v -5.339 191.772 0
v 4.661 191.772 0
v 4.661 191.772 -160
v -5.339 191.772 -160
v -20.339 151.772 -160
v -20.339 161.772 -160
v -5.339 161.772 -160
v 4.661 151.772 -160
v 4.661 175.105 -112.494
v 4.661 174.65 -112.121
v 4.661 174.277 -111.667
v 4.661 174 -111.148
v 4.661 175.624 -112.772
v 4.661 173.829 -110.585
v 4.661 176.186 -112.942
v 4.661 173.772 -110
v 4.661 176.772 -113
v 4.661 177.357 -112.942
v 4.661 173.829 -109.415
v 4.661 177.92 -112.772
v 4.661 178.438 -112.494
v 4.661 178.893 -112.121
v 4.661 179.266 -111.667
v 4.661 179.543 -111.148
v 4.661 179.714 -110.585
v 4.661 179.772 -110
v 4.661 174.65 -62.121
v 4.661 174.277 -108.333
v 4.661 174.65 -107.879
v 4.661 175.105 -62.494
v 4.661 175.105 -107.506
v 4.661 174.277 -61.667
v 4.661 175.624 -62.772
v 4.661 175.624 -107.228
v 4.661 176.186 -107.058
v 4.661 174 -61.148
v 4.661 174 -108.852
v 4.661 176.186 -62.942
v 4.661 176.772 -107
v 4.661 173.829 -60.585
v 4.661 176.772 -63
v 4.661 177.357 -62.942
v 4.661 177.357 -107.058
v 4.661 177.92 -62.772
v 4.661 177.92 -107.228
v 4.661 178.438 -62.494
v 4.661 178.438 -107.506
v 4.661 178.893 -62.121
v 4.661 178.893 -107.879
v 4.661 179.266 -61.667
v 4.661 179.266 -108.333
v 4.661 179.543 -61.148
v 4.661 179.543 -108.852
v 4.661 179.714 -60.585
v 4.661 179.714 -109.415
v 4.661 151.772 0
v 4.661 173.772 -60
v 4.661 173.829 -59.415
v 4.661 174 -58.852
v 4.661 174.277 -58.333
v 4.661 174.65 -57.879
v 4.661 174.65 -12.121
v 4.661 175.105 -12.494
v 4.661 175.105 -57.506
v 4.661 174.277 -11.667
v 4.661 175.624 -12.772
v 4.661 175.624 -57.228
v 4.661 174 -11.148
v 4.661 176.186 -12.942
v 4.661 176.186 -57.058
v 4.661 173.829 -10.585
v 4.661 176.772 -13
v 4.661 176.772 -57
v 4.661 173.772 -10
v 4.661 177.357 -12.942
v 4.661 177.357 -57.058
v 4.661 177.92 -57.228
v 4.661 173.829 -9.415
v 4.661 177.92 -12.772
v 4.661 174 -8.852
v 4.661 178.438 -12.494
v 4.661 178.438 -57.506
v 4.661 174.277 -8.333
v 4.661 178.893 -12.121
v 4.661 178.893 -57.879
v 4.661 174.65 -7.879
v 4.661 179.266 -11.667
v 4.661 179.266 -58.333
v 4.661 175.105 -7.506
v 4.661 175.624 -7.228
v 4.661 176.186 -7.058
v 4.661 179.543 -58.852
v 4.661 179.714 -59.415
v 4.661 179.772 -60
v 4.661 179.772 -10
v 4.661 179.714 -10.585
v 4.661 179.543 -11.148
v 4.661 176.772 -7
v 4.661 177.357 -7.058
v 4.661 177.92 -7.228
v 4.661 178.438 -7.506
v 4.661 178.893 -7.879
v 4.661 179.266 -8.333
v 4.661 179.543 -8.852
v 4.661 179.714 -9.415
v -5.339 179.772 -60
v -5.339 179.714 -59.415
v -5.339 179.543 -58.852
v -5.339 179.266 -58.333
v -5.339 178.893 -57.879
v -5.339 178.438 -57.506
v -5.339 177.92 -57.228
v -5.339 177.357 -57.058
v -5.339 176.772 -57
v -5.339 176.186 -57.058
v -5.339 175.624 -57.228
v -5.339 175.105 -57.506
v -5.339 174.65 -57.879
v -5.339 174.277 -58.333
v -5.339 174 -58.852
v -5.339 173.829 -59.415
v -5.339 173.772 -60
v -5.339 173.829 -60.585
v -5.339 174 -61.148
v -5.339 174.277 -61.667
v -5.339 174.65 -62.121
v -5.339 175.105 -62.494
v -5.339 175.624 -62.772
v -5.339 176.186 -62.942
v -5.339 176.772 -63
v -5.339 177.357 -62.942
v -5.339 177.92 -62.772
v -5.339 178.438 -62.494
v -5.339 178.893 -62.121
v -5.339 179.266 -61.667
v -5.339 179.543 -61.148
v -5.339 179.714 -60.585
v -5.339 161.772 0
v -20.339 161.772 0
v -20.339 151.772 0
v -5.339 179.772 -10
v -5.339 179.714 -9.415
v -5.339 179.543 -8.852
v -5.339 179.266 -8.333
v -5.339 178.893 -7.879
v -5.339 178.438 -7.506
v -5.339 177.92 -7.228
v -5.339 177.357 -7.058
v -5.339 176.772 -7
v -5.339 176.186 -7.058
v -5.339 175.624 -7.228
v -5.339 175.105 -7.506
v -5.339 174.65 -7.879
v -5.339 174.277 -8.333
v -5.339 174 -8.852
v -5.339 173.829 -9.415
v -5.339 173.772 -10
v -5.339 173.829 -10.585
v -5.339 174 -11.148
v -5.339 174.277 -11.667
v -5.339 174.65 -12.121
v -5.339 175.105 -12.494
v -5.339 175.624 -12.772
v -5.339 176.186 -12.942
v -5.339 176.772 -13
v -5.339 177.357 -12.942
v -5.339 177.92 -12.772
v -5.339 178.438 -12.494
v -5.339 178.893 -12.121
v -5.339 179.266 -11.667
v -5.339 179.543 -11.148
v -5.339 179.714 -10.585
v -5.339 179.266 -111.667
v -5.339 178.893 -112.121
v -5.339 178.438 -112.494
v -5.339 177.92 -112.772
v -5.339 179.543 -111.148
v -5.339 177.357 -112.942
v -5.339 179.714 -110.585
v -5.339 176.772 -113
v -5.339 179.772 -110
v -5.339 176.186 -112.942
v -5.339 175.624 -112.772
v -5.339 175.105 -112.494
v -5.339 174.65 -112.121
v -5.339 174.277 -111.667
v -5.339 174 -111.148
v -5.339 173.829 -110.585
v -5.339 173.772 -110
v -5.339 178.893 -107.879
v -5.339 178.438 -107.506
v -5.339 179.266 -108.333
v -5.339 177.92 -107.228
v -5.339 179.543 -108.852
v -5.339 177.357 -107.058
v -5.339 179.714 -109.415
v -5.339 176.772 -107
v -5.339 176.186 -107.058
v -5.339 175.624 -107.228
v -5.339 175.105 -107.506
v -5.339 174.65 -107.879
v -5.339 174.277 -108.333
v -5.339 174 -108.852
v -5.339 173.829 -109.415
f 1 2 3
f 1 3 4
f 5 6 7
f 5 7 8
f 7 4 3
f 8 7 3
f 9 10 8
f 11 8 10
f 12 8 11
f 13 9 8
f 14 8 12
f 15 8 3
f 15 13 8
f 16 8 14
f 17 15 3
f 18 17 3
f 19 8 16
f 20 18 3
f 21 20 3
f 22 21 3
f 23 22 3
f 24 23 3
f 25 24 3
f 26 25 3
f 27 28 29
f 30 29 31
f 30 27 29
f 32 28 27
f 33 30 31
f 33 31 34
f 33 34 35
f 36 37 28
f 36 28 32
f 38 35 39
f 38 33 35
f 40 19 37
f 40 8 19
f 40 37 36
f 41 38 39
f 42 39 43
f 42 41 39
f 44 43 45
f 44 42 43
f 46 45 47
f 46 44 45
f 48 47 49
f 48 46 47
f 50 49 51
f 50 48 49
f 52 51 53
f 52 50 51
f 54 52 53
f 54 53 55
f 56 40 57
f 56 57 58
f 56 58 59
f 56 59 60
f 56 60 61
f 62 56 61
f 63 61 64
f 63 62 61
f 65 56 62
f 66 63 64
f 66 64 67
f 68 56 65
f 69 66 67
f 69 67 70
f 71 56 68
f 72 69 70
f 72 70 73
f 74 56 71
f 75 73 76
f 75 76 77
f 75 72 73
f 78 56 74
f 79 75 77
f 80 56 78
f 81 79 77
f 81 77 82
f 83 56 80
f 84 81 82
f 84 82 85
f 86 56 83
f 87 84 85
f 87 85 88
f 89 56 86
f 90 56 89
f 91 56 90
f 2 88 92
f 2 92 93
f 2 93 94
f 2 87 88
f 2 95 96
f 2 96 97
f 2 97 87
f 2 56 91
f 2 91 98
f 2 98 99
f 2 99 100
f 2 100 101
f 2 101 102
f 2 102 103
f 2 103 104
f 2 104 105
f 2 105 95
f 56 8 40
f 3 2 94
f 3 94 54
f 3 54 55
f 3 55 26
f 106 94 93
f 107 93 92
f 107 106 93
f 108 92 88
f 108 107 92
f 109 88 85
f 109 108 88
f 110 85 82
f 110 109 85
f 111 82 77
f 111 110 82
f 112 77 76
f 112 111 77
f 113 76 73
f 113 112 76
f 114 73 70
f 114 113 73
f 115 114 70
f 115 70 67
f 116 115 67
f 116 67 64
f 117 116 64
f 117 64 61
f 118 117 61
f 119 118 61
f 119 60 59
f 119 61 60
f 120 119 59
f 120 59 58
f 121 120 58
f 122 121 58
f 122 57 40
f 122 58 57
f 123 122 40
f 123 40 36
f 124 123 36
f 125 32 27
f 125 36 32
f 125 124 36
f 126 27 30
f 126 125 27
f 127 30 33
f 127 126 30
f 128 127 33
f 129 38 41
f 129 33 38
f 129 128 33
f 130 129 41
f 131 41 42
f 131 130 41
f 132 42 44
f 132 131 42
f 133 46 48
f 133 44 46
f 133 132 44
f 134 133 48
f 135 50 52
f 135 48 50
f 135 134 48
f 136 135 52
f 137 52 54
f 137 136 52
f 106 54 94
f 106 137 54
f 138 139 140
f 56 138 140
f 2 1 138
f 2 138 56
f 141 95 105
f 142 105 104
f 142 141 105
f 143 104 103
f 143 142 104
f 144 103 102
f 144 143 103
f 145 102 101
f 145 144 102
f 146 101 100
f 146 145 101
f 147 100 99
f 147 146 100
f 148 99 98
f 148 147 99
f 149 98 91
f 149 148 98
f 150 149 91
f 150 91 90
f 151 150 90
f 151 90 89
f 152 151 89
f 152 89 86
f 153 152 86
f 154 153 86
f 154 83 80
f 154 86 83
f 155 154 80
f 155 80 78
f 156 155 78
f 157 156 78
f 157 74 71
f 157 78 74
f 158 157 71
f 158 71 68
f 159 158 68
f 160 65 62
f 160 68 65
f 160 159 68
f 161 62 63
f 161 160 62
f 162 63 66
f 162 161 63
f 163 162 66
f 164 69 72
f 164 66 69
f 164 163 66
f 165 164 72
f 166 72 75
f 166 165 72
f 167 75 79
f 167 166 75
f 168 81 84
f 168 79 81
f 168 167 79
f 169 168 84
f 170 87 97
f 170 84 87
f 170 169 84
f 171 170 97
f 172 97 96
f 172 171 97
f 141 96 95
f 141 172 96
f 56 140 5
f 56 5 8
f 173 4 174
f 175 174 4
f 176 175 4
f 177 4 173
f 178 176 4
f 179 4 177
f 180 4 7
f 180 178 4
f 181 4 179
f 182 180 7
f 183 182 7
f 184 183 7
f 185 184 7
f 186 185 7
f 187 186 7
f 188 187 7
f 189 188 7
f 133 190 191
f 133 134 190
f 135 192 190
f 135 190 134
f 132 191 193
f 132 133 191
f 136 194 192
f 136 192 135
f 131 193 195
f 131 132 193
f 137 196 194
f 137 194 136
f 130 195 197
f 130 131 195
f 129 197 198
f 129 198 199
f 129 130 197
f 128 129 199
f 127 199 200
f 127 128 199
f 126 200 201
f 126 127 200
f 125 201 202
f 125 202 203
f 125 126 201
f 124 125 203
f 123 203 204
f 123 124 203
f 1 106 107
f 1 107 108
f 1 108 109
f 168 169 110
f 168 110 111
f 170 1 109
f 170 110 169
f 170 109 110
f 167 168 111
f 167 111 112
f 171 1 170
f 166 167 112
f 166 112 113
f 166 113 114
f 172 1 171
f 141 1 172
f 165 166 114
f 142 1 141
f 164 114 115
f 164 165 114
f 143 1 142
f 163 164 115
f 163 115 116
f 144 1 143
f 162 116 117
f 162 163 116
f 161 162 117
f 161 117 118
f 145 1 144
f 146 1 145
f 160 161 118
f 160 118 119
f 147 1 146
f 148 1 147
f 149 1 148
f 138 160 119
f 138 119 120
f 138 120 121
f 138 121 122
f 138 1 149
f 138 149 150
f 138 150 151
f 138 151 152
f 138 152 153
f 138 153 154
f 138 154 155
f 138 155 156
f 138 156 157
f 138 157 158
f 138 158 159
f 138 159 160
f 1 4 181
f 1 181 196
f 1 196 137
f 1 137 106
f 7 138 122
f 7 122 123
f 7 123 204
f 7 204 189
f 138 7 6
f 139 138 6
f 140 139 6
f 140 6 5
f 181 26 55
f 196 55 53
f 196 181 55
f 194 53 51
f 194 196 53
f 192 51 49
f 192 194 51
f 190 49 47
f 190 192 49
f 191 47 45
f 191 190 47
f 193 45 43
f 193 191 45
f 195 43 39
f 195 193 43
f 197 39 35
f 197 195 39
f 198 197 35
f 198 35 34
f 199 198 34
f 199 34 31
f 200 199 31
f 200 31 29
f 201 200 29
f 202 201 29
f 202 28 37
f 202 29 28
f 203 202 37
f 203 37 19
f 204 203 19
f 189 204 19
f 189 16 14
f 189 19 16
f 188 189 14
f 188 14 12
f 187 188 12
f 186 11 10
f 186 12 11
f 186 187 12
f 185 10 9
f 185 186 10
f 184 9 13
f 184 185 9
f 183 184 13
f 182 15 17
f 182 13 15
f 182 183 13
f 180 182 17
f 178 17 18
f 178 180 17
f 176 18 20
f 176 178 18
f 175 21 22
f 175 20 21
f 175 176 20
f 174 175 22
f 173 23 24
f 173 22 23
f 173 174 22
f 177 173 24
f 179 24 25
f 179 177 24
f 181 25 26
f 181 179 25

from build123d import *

# Parameters (mm, degrees)
EXTRUDE_1_DEPTH     = 160
CUT_EXTRUDE_START   = -10
SKETCH_2_R          = 3
CUT_EXTRUDE_1_DEPTH = 262.00066797
LPATTERN1_COUNT     = 3
LPATTERN1_PITCH     = 50


with BuildPart() as part:
    # 草圖1 → 填料-伸長1 (new body)
    with BuildSketch(Plane.XY):
        Polygon((-5.338534676, 191.77157068), (-5.338534676, 161.77157068), (-20.338534676, 161.77157068), (-20.338534676, 151.77157068), (4.661465324, 151.77157068), (4.661465324, 191.77157068), align=None)
    extrude(amount=-EXTRUDE_1_DEPTH)

    # 草圖2 → 除料-伸長1 (cut)
    with BuildSketch(Plane(origin=(4.661465324, 0, 0), x_dir=(0, 0, -1), z_dir=(1, 0, 0)).offset(CUT_EXTRUDE_START)):
        with Locations(Location((110, 176.77157068, 0), (0, 0, 90))):
            Circle(SKETCH_2_R)
    cut_extrude_1 = extrude(amount=CUT_EXTRUDE_1_DEPTH, mode=Mode.SUBTRACT)

    # LPattern1: 除料-伸長1 ×3
    with Locations(*[(0, 0, i * LPATTERN1_PITCH) for i in range(1, LPATTERN1_COUNT)]):
        add(cut_extrude_1, mode=Mode.SUBTRACT)


solid = part.part
